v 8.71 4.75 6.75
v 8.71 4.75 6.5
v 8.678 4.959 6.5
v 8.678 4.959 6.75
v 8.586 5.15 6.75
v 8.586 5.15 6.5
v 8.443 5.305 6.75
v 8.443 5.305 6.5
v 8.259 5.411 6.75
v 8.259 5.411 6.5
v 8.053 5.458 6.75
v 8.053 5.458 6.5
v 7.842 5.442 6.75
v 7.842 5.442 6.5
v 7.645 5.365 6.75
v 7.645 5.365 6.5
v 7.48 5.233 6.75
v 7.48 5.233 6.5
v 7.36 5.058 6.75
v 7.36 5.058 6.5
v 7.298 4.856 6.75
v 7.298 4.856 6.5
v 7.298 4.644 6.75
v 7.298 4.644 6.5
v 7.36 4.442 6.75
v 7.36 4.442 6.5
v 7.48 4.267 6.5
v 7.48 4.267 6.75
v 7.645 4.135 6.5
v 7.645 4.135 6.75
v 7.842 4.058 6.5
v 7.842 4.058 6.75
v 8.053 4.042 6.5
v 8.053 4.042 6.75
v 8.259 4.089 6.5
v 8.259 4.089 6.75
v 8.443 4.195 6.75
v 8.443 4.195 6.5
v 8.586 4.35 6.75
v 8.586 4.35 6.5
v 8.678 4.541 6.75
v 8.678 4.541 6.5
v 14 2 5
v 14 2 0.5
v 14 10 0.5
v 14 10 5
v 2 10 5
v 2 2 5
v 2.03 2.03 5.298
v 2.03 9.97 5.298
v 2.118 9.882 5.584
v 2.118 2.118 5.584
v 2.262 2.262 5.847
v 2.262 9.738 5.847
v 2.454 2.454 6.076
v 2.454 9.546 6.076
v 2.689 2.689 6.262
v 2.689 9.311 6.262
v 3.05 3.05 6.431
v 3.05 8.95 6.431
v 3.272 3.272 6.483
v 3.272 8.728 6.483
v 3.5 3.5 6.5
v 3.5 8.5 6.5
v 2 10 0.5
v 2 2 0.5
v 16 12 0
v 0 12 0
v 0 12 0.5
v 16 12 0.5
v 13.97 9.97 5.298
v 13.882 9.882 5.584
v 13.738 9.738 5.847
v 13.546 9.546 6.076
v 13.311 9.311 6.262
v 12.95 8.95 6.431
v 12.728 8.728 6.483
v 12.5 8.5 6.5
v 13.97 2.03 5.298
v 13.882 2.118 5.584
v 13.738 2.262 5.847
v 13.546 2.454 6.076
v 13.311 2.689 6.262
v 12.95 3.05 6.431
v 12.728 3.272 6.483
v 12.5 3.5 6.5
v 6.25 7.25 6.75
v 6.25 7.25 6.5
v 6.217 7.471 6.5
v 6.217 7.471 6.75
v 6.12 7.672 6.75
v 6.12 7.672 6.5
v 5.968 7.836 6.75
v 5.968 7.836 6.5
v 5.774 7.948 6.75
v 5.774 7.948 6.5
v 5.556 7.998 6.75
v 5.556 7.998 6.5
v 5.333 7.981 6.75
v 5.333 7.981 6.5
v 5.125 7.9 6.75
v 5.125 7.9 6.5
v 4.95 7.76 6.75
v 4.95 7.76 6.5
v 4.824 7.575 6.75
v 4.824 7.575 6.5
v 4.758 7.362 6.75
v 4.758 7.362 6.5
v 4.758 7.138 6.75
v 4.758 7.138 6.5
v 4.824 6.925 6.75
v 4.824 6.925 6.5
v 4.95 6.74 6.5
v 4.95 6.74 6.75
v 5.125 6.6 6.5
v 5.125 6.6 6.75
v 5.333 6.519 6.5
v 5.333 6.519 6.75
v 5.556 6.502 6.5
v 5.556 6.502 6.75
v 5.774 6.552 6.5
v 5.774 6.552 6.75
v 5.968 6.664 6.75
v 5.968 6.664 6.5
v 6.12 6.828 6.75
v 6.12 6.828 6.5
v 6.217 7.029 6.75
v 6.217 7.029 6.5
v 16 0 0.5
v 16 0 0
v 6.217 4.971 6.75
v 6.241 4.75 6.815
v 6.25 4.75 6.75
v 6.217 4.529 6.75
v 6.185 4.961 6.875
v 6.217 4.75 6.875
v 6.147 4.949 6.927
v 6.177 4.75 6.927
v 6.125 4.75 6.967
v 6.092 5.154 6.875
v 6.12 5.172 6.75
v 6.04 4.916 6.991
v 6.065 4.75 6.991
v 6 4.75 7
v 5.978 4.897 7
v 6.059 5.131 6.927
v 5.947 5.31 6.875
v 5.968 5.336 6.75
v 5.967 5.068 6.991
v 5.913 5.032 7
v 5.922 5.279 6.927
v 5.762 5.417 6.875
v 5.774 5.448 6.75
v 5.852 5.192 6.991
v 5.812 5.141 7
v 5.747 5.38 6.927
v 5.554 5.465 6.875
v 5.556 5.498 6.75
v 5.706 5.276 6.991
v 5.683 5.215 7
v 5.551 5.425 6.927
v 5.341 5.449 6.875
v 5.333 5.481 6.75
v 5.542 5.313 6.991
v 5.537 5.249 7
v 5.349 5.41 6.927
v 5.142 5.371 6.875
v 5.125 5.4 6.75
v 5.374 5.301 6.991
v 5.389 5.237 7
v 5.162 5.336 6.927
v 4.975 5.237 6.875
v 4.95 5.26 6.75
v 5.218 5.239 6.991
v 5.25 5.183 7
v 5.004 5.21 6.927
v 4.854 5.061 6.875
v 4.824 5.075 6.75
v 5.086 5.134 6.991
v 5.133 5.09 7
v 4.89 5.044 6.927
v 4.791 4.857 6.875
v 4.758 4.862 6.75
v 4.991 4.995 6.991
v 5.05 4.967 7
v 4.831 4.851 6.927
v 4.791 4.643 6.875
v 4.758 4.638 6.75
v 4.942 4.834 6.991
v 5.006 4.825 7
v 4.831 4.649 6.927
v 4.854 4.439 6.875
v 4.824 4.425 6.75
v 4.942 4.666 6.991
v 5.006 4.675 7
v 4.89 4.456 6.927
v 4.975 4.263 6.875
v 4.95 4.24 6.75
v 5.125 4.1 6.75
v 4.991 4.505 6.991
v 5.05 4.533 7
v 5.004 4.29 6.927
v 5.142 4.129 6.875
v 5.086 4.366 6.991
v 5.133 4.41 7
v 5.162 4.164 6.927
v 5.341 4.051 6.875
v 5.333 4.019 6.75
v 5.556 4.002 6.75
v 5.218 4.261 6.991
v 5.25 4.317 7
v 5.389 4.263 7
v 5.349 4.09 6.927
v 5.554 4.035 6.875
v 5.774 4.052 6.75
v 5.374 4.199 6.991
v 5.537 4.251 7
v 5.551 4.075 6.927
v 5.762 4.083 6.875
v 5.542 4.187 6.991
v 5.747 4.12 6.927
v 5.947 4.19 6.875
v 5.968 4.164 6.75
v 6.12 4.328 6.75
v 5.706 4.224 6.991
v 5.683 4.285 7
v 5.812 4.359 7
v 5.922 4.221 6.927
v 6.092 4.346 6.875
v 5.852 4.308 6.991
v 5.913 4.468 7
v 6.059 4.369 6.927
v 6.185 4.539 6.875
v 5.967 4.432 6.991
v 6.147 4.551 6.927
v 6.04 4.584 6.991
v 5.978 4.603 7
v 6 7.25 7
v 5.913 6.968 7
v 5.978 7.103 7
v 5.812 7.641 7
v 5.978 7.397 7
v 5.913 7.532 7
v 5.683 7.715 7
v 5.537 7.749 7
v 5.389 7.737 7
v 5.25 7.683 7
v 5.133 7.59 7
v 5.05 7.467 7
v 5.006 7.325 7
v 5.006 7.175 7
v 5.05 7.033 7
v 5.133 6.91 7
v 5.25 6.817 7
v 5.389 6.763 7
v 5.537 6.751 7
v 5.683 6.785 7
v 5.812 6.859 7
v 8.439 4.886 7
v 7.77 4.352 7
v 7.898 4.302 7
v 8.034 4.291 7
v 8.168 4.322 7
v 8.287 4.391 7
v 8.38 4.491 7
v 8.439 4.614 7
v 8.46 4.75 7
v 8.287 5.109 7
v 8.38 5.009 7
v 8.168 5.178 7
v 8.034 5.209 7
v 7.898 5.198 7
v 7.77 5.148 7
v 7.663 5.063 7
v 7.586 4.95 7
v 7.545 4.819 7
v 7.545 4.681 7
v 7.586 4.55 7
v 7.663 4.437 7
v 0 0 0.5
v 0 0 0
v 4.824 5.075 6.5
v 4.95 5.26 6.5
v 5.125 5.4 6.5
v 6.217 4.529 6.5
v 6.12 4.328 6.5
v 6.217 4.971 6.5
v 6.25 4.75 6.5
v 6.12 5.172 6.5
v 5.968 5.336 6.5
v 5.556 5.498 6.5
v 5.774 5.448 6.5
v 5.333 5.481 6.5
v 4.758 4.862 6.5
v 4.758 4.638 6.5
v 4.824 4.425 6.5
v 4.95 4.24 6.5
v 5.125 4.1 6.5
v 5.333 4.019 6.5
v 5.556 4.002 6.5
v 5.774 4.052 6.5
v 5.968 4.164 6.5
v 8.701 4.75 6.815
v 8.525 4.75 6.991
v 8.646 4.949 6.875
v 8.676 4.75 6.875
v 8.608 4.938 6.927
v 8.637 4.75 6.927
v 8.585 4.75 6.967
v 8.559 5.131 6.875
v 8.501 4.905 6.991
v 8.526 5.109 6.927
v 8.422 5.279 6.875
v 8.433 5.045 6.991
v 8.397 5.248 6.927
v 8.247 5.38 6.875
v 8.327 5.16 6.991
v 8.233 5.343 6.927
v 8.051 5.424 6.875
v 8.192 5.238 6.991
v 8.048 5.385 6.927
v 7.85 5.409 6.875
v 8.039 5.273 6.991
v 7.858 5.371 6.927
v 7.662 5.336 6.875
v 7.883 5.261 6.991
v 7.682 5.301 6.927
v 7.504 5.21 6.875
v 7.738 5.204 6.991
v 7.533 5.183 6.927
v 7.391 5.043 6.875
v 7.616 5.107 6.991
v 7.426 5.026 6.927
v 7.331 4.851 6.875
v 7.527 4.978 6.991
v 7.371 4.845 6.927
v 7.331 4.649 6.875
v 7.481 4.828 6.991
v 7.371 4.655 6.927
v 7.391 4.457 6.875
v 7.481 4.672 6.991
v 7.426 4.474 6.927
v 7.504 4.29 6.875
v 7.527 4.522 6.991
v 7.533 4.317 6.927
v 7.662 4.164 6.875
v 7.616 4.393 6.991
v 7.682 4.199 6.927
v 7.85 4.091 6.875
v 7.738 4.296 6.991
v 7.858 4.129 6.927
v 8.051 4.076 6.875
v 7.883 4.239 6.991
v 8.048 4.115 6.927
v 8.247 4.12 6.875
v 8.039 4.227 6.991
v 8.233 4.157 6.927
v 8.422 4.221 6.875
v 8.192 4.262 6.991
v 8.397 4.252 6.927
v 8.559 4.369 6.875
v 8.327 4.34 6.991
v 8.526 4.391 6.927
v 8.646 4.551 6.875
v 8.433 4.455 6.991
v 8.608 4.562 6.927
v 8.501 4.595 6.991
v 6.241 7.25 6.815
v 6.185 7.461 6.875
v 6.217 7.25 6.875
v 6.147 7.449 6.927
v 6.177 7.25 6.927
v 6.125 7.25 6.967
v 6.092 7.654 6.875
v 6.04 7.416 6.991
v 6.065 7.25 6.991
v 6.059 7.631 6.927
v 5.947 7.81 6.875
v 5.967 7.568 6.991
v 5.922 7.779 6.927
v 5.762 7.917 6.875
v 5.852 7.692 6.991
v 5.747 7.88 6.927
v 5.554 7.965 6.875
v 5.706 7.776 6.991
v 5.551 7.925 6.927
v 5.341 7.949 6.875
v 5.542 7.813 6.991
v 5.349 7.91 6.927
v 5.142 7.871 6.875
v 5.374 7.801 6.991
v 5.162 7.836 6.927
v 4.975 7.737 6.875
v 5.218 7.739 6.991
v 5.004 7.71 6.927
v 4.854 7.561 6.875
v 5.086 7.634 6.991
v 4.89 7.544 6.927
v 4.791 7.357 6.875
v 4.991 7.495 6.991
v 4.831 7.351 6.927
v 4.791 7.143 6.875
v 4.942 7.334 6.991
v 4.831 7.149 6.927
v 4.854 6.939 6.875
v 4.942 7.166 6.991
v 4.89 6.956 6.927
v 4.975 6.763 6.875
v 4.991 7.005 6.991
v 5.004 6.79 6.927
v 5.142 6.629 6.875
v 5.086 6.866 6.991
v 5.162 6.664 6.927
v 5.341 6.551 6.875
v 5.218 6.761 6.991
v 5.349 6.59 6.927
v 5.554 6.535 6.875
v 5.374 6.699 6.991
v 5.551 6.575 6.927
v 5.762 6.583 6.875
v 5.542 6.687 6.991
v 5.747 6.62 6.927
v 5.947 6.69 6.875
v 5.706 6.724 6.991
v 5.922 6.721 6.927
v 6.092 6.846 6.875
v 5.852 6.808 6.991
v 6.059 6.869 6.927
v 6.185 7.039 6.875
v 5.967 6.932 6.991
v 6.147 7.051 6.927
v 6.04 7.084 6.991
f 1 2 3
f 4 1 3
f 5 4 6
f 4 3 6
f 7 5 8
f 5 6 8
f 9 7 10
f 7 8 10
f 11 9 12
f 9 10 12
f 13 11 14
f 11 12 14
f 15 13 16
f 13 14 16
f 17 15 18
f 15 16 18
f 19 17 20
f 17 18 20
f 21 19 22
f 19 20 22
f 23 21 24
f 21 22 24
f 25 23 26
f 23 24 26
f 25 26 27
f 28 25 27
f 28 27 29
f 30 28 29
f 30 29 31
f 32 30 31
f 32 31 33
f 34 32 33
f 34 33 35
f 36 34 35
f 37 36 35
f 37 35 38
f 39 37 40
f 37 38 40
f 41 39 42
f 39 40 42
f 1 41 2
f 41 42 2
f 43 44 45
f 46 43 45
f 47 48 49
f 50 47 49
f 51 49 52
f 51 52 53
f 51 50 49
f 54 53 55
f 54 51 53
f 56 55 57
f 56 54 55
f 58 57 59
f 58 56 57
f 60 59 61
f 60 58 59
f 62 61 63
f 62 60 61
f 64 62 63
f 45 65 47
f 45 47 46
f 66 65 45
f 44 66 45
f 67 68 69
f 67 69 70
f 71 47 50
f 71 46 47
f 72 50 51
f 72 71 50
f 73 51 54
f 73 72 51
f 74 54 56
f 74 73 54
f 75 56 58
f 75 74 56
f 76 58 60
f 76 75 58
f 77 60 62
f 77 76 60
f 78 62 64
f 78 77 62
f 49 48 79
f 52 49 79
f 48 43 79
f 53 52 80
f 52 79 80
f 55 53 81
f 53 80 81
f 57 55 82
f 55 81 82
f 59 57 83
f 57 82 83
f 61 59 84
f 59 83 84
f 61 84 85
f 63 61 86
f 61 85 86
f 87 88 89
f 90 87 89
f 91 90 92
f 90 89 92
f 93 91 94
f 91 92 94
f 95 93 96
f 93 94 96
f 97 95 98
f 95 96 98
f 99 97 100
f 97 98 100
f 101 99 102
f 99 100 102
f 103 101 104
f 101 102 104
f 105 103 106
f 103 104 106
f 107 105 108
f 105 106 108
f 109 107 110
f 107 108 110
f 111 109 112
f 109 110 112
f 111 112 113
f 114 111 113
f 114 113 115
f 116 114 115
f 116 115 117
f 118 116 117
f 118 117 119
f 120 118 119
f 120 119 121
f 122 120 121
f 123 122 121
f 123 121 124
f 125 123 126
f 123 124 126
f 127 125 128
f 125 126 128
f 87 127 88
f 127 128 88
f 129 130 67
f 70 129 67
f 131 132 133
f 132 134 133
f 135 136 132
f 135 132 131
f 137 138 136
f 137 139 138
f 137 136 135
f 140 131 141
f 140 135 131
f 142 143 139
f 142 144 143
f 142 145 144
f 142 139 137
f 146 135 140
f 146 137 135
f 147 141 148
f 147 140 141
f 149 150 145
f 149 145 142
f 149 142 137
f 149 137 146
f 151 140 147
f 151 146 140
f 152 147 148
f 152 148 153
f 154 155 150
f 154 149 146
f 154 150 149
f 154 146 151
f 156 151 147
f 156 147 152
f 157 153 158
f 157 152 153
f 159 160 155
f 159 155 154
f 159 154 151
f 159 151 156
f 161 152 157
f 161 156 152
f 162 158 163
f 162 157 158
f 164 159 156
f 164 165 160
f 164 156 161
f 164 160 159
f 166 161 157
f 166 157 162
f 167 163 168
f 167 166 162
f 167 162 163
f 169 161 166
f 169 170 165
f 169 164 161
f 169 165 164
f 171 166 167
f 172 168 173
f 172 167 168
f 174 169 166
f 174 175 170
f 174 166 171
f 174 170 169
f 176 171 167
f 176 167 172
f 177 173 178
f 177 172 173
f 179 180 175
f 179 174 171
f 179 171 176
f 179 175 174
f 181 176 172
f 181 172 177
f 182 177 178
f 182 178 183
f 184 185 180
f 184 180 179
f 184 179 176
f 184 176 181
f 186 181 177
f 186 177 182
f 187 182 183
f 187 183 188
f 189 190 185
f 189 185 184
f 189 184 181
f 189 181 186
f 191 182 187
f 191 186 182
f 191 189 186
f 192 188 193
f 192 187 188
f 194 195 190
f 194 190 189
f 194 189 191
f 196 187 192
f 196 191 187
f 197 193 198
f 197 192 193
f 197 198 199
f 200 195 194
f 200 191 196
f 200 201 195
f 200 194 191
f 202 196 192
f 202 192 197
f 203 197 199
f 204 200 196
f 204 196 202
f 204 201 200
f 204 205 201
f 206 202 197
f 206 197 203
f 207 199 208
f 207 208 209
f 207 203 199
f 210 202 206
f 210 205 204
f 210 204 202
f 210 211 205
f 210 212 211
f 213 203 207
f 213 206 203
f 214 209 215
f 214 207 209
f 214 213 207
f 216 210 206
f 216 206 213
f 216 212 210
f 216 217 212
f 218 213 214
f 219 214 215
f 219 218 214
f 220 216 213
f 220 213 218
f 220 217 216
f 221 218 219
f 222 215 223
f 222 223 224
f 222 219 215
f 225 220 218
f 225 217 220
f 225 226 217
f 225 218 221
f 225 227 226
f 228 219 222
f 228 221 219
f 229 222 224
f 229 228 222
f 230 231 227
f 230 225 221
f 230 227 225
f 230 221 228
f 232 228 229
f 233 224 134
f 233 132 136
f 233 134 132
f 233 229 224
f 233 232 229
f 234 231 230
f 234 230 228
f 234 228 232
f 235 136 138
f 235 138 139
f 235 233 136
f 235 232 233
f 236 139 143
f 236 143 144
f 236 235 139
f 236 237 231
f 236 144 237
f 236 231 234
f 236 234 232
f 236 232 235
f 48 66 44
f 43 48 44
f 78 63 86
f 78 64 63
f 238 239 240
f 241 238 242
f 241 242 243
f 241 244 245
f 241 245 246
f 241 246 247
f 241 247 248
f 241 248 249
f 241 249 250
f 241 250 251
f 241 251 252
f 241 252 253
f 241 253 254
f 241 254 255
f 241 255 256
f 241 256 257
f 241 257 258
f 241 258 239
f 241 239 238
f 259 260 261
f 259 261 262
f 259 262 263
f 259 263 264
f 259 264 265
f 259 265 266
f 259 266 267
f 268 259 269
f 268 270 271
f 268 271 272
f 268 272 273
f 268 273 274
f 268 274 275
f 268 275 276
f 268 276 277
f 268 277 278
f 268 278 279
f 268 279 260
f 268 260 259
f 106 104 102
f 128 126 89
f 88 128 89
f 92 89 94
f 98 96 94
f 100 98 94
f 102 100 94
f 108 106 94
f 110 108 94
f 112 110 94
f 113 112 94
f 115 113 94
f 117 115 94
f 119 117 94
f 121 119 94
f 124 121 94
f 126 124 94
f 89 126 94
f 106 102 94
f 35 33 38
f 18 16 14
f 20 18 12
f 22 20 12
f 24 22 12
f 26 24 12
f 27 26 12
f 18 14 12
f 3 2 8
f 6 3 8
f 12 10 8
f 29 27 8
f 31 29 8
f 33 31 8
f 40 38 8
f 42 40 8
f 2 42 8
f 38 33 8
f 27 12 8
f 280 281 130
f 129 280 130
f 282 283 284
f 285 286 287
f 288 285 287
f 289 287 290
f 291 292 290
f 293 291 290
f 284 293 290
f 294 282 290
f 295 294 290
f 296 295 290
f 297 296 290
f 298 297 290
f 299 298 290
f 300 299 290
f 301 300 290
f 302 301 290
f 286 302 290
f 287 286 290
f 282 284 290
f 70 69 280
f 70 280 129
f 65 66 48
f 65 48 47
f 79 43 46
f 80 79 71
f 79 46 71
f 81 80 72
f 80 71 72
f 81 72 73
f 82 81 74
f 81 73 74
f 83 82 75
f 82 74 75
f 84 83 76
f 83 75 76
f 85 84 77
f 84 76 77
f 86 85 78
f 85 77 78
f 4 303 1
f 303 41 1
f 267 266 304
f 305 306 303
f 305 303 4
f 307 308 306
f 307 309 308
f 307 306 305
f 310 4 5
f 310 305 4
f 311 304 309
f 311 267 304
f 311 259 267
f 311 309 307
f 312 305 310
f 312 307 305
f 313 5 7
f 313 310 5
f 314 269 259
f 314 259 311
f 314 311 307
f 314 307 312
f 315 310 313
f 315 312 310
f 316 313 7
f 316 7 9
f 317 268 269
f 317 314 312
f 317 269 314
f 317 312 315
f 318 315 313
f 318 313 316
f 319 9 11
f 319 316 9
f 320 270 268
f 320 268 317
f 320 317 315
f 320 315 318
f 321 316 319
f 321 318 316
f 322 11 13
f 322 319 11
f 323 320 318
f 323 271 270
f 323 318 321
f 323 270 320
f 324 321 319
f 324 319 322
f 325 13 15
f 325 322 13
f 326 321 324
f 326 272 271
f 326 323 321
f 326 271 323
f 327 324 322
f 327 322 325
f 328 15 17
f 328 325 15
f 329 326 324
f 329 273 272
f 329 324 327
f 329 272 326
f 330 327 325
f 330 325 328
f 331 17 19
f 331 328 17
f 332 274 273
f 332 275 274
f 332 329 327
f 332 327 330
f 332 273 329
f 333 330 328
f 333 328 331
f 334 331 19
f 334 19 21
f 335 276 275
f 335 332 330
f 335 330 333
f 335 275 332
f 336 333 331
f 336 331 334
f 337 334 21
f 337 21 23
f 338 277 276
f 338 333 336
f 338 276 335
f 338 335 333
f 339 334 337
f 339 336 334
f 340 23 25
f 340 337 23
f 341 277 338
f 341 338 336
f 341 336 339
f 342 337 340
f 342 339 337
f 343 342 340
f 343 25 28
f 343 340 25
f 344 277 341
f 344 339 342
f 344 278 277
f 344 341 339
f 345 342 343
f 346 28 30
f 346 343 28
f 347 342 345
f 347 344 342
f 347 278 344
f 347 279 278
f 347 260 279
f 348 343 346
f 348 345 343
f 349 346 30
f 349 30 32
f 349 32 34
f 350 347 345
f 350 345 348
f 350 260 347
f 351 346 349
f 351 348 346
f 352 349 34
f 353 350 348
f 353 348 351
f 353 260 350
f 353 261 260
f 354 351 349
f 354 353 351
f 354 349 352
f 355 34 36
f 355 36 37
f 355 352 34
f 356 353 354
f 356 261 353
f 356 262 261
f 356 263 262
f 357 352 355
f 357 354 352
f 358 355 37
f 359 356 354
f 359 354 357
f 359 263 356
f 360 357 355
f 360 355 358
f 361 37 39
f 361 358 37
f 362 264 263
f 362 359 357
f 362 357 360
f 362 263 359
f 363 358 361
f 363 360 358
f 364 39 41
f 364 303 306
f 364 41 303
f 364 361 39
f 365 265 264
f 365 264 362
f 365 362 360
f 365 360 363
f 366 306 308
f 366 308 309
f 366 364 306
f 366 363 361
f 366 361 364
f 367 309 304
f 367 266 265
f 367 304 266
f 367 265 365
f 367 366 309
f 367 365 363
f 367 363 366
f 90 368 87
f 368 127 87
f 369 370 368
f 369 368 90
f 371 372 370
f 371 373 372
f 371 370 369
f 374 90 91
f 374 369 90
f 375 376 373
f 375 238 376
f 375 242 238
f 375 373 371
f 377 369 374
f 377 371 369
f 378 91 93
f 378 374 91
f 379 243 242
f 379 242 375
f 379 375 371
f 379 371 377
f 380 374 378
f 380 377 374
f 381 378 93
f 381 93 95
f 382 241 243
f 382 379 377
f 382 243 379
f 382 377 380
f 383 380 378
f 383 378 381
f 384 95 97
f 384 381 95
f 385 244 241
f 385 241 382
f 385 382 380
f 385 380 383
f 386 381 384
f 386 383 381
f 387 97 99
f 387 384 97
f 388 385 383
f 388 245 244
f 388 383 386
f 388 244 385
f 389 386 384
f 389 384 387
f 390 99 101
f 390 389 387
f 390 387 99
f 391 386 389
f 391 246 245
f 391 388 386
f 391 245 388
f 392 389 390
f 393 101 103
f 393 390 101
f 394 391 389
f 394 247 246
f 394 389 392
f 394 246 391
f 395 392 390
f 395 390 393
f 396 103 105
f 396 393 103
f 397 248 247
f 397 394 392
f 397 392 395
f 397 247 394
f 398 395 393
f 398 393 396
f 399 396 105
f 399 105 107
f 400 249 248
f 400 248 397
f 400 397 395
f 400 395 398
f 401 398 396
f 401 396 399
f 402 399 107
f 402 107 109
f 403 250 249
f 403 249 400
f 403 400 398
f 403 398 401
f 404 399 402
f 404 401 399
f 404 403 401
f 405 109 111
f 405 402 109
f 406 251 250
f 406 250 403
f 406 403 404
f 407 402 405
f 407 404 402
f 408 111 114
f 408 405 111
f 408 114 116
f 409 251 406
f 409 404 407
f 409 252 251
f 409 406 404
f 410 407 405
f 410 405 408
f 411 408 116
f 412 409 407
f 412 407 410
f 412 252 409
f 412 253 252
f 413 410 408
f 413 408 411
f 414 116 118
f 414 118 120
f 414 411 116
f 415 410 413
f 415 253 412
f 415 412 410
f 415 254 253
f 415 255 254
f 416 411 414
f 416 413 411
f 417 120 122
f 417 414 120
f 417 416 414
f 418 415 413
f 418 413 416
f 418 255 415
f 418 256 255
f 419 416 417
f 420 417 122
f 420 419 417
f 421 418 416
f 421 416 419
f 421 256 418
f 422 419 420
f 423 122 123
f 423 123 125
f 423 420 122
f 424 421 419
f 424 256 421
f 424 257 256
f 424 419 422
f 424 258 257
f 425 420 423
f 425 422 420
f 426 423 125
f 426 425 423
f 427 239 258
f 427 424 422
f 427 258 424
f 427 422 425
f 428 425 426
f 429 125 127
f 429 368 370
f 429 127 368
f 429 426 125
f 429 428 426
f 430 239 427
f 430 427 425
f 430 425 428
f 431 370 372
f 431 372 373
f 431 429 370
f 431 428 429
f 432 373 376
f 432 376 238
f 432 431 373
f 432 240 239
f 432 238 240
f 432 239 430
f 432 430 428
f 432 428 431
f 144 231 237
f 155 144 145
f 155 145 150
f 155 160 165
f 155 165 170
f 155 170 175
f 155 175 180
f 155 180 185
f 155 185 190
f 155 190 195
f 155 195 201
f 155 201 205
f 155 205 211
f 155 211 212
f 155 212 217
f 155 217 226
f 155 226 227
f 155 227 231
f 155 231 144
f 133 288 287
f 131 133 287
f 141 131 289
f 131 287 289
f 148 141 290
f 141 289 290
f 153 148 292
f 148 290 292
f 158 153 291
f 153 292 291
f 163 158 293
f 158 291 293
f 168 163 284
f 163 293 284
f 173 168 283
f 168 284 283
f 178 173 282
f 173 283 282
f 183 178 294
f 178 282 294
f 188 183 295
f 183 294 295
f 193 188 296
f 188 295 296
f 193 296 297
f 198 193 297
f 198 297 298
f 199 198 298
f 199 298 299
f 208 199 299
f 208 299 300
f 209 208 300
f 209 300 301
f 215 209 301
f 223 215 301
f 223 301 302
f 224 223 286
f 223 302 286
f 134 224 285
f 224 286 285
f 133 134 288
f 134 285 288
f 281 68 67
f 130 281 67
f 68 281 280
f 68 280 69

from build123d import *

# Parameters (mm, degrees)
SKETCH_W     = 16
SKETCH_H     = 12
PAD_DEPTH    = 0.5
SKETCH001_W  = 12
SKETCH001_H  = 8
PAD001_DEPTH = 6
FILLET_R     = 1.5
SKETCH002_R  = 0.75
PAD002_DEPTH = 0.5
FILLET001_R  = 0.25
SKETCH003_R  = 0.709805
PAD003_DEPTH = 0.5
FILLET002_R  = 0.25
SKETCH004_R  = 0.75
PAD004_DEPTH = 0.5
FILLET003_R  = 0.25


with BuildPart() as pad:
    # Sketch → Pad (new body)
    with BuildSketch(Plane.XY):
        with Locations((8, 6)):
            Rectangle(SKETCH_W, SKETCH_H)
    extrude(amount=PAD_DEPTH)


with BuildPart() as fillet_body:
    # Sketch001 → Pad001 (new body)
    with BuildSketch(Plane.XY.offset(0.5)):
        with Locations((8, 6)):
            Rectangle(SKETCH001_W, SKETCH001_H)
    extrude(amount=PAD001_DEPTH)

    # Fillet
    fillet_edges = [fillet_body.edges().sort_by_distance(p)[0] for p in [
        (8, 2, 6.5),
        (14, 6, 6.5),
        (8, 10, 6.5),
        (2, 6, 6.5),
    ]]
    fillet(fillet_edges, radius=FILLET_R)


with BuildPart() as fillet001:
    # Sketch002 → Pad002 (new body)
    with BuildSketch(Plane.XY.offset(6.5)):
        with Locations((5.5, 4.75)):
            Circle(SKETCH002_R)
    extrude(amount=PAD002_DEPTH)

    # Fillet001
    fillet001_edges = [fillet001.edges().sort_by_distance(p)[0] for p in [
        (4.75, 4.75, 7),
    ]]
    fillet(fillet001_edges, radius=FILLET001_R)


with BuildPart() as fillet002:
    # Sketch003 → Pad003 (new body)
    with BuildSketch(Plane.XY.offset(6.5)):
        with Locations((8, 4.75)):
            Circle(SKETCH003_R)
    extrude(amount=PAD003_DEPTH)

    # Fillet002
    fillet002_edges = [fillet002.edges().sort_by_distance(p)[0] for p in [
        (7.290195, 4.75, 7),
    ]]
    fillet(fillet002_edges, radius=FILLET002_R)


with BuildPart() as fillet003:
    # Sketch004 → Pad004 (new body)
    with BuildSketch(Plane.XY.offset(6.5)):
        with Locations((5.5, 7.25)):
            Circle(SKETCH004_R)
    extrude(amount=PAD004_DEPTH)

    # Fillet003
    fillet003_edges = [fillet003.edges().sort_by_distance(p)[0] for p in [
        (4.75, 7.25, 7),
    ]]
    fillet(fillet003_edges, radius=FILLET003_R)


solid = Compound([pad.part, fillet_body.part, fillet001.part, fillet002.part, fillet003.part])
